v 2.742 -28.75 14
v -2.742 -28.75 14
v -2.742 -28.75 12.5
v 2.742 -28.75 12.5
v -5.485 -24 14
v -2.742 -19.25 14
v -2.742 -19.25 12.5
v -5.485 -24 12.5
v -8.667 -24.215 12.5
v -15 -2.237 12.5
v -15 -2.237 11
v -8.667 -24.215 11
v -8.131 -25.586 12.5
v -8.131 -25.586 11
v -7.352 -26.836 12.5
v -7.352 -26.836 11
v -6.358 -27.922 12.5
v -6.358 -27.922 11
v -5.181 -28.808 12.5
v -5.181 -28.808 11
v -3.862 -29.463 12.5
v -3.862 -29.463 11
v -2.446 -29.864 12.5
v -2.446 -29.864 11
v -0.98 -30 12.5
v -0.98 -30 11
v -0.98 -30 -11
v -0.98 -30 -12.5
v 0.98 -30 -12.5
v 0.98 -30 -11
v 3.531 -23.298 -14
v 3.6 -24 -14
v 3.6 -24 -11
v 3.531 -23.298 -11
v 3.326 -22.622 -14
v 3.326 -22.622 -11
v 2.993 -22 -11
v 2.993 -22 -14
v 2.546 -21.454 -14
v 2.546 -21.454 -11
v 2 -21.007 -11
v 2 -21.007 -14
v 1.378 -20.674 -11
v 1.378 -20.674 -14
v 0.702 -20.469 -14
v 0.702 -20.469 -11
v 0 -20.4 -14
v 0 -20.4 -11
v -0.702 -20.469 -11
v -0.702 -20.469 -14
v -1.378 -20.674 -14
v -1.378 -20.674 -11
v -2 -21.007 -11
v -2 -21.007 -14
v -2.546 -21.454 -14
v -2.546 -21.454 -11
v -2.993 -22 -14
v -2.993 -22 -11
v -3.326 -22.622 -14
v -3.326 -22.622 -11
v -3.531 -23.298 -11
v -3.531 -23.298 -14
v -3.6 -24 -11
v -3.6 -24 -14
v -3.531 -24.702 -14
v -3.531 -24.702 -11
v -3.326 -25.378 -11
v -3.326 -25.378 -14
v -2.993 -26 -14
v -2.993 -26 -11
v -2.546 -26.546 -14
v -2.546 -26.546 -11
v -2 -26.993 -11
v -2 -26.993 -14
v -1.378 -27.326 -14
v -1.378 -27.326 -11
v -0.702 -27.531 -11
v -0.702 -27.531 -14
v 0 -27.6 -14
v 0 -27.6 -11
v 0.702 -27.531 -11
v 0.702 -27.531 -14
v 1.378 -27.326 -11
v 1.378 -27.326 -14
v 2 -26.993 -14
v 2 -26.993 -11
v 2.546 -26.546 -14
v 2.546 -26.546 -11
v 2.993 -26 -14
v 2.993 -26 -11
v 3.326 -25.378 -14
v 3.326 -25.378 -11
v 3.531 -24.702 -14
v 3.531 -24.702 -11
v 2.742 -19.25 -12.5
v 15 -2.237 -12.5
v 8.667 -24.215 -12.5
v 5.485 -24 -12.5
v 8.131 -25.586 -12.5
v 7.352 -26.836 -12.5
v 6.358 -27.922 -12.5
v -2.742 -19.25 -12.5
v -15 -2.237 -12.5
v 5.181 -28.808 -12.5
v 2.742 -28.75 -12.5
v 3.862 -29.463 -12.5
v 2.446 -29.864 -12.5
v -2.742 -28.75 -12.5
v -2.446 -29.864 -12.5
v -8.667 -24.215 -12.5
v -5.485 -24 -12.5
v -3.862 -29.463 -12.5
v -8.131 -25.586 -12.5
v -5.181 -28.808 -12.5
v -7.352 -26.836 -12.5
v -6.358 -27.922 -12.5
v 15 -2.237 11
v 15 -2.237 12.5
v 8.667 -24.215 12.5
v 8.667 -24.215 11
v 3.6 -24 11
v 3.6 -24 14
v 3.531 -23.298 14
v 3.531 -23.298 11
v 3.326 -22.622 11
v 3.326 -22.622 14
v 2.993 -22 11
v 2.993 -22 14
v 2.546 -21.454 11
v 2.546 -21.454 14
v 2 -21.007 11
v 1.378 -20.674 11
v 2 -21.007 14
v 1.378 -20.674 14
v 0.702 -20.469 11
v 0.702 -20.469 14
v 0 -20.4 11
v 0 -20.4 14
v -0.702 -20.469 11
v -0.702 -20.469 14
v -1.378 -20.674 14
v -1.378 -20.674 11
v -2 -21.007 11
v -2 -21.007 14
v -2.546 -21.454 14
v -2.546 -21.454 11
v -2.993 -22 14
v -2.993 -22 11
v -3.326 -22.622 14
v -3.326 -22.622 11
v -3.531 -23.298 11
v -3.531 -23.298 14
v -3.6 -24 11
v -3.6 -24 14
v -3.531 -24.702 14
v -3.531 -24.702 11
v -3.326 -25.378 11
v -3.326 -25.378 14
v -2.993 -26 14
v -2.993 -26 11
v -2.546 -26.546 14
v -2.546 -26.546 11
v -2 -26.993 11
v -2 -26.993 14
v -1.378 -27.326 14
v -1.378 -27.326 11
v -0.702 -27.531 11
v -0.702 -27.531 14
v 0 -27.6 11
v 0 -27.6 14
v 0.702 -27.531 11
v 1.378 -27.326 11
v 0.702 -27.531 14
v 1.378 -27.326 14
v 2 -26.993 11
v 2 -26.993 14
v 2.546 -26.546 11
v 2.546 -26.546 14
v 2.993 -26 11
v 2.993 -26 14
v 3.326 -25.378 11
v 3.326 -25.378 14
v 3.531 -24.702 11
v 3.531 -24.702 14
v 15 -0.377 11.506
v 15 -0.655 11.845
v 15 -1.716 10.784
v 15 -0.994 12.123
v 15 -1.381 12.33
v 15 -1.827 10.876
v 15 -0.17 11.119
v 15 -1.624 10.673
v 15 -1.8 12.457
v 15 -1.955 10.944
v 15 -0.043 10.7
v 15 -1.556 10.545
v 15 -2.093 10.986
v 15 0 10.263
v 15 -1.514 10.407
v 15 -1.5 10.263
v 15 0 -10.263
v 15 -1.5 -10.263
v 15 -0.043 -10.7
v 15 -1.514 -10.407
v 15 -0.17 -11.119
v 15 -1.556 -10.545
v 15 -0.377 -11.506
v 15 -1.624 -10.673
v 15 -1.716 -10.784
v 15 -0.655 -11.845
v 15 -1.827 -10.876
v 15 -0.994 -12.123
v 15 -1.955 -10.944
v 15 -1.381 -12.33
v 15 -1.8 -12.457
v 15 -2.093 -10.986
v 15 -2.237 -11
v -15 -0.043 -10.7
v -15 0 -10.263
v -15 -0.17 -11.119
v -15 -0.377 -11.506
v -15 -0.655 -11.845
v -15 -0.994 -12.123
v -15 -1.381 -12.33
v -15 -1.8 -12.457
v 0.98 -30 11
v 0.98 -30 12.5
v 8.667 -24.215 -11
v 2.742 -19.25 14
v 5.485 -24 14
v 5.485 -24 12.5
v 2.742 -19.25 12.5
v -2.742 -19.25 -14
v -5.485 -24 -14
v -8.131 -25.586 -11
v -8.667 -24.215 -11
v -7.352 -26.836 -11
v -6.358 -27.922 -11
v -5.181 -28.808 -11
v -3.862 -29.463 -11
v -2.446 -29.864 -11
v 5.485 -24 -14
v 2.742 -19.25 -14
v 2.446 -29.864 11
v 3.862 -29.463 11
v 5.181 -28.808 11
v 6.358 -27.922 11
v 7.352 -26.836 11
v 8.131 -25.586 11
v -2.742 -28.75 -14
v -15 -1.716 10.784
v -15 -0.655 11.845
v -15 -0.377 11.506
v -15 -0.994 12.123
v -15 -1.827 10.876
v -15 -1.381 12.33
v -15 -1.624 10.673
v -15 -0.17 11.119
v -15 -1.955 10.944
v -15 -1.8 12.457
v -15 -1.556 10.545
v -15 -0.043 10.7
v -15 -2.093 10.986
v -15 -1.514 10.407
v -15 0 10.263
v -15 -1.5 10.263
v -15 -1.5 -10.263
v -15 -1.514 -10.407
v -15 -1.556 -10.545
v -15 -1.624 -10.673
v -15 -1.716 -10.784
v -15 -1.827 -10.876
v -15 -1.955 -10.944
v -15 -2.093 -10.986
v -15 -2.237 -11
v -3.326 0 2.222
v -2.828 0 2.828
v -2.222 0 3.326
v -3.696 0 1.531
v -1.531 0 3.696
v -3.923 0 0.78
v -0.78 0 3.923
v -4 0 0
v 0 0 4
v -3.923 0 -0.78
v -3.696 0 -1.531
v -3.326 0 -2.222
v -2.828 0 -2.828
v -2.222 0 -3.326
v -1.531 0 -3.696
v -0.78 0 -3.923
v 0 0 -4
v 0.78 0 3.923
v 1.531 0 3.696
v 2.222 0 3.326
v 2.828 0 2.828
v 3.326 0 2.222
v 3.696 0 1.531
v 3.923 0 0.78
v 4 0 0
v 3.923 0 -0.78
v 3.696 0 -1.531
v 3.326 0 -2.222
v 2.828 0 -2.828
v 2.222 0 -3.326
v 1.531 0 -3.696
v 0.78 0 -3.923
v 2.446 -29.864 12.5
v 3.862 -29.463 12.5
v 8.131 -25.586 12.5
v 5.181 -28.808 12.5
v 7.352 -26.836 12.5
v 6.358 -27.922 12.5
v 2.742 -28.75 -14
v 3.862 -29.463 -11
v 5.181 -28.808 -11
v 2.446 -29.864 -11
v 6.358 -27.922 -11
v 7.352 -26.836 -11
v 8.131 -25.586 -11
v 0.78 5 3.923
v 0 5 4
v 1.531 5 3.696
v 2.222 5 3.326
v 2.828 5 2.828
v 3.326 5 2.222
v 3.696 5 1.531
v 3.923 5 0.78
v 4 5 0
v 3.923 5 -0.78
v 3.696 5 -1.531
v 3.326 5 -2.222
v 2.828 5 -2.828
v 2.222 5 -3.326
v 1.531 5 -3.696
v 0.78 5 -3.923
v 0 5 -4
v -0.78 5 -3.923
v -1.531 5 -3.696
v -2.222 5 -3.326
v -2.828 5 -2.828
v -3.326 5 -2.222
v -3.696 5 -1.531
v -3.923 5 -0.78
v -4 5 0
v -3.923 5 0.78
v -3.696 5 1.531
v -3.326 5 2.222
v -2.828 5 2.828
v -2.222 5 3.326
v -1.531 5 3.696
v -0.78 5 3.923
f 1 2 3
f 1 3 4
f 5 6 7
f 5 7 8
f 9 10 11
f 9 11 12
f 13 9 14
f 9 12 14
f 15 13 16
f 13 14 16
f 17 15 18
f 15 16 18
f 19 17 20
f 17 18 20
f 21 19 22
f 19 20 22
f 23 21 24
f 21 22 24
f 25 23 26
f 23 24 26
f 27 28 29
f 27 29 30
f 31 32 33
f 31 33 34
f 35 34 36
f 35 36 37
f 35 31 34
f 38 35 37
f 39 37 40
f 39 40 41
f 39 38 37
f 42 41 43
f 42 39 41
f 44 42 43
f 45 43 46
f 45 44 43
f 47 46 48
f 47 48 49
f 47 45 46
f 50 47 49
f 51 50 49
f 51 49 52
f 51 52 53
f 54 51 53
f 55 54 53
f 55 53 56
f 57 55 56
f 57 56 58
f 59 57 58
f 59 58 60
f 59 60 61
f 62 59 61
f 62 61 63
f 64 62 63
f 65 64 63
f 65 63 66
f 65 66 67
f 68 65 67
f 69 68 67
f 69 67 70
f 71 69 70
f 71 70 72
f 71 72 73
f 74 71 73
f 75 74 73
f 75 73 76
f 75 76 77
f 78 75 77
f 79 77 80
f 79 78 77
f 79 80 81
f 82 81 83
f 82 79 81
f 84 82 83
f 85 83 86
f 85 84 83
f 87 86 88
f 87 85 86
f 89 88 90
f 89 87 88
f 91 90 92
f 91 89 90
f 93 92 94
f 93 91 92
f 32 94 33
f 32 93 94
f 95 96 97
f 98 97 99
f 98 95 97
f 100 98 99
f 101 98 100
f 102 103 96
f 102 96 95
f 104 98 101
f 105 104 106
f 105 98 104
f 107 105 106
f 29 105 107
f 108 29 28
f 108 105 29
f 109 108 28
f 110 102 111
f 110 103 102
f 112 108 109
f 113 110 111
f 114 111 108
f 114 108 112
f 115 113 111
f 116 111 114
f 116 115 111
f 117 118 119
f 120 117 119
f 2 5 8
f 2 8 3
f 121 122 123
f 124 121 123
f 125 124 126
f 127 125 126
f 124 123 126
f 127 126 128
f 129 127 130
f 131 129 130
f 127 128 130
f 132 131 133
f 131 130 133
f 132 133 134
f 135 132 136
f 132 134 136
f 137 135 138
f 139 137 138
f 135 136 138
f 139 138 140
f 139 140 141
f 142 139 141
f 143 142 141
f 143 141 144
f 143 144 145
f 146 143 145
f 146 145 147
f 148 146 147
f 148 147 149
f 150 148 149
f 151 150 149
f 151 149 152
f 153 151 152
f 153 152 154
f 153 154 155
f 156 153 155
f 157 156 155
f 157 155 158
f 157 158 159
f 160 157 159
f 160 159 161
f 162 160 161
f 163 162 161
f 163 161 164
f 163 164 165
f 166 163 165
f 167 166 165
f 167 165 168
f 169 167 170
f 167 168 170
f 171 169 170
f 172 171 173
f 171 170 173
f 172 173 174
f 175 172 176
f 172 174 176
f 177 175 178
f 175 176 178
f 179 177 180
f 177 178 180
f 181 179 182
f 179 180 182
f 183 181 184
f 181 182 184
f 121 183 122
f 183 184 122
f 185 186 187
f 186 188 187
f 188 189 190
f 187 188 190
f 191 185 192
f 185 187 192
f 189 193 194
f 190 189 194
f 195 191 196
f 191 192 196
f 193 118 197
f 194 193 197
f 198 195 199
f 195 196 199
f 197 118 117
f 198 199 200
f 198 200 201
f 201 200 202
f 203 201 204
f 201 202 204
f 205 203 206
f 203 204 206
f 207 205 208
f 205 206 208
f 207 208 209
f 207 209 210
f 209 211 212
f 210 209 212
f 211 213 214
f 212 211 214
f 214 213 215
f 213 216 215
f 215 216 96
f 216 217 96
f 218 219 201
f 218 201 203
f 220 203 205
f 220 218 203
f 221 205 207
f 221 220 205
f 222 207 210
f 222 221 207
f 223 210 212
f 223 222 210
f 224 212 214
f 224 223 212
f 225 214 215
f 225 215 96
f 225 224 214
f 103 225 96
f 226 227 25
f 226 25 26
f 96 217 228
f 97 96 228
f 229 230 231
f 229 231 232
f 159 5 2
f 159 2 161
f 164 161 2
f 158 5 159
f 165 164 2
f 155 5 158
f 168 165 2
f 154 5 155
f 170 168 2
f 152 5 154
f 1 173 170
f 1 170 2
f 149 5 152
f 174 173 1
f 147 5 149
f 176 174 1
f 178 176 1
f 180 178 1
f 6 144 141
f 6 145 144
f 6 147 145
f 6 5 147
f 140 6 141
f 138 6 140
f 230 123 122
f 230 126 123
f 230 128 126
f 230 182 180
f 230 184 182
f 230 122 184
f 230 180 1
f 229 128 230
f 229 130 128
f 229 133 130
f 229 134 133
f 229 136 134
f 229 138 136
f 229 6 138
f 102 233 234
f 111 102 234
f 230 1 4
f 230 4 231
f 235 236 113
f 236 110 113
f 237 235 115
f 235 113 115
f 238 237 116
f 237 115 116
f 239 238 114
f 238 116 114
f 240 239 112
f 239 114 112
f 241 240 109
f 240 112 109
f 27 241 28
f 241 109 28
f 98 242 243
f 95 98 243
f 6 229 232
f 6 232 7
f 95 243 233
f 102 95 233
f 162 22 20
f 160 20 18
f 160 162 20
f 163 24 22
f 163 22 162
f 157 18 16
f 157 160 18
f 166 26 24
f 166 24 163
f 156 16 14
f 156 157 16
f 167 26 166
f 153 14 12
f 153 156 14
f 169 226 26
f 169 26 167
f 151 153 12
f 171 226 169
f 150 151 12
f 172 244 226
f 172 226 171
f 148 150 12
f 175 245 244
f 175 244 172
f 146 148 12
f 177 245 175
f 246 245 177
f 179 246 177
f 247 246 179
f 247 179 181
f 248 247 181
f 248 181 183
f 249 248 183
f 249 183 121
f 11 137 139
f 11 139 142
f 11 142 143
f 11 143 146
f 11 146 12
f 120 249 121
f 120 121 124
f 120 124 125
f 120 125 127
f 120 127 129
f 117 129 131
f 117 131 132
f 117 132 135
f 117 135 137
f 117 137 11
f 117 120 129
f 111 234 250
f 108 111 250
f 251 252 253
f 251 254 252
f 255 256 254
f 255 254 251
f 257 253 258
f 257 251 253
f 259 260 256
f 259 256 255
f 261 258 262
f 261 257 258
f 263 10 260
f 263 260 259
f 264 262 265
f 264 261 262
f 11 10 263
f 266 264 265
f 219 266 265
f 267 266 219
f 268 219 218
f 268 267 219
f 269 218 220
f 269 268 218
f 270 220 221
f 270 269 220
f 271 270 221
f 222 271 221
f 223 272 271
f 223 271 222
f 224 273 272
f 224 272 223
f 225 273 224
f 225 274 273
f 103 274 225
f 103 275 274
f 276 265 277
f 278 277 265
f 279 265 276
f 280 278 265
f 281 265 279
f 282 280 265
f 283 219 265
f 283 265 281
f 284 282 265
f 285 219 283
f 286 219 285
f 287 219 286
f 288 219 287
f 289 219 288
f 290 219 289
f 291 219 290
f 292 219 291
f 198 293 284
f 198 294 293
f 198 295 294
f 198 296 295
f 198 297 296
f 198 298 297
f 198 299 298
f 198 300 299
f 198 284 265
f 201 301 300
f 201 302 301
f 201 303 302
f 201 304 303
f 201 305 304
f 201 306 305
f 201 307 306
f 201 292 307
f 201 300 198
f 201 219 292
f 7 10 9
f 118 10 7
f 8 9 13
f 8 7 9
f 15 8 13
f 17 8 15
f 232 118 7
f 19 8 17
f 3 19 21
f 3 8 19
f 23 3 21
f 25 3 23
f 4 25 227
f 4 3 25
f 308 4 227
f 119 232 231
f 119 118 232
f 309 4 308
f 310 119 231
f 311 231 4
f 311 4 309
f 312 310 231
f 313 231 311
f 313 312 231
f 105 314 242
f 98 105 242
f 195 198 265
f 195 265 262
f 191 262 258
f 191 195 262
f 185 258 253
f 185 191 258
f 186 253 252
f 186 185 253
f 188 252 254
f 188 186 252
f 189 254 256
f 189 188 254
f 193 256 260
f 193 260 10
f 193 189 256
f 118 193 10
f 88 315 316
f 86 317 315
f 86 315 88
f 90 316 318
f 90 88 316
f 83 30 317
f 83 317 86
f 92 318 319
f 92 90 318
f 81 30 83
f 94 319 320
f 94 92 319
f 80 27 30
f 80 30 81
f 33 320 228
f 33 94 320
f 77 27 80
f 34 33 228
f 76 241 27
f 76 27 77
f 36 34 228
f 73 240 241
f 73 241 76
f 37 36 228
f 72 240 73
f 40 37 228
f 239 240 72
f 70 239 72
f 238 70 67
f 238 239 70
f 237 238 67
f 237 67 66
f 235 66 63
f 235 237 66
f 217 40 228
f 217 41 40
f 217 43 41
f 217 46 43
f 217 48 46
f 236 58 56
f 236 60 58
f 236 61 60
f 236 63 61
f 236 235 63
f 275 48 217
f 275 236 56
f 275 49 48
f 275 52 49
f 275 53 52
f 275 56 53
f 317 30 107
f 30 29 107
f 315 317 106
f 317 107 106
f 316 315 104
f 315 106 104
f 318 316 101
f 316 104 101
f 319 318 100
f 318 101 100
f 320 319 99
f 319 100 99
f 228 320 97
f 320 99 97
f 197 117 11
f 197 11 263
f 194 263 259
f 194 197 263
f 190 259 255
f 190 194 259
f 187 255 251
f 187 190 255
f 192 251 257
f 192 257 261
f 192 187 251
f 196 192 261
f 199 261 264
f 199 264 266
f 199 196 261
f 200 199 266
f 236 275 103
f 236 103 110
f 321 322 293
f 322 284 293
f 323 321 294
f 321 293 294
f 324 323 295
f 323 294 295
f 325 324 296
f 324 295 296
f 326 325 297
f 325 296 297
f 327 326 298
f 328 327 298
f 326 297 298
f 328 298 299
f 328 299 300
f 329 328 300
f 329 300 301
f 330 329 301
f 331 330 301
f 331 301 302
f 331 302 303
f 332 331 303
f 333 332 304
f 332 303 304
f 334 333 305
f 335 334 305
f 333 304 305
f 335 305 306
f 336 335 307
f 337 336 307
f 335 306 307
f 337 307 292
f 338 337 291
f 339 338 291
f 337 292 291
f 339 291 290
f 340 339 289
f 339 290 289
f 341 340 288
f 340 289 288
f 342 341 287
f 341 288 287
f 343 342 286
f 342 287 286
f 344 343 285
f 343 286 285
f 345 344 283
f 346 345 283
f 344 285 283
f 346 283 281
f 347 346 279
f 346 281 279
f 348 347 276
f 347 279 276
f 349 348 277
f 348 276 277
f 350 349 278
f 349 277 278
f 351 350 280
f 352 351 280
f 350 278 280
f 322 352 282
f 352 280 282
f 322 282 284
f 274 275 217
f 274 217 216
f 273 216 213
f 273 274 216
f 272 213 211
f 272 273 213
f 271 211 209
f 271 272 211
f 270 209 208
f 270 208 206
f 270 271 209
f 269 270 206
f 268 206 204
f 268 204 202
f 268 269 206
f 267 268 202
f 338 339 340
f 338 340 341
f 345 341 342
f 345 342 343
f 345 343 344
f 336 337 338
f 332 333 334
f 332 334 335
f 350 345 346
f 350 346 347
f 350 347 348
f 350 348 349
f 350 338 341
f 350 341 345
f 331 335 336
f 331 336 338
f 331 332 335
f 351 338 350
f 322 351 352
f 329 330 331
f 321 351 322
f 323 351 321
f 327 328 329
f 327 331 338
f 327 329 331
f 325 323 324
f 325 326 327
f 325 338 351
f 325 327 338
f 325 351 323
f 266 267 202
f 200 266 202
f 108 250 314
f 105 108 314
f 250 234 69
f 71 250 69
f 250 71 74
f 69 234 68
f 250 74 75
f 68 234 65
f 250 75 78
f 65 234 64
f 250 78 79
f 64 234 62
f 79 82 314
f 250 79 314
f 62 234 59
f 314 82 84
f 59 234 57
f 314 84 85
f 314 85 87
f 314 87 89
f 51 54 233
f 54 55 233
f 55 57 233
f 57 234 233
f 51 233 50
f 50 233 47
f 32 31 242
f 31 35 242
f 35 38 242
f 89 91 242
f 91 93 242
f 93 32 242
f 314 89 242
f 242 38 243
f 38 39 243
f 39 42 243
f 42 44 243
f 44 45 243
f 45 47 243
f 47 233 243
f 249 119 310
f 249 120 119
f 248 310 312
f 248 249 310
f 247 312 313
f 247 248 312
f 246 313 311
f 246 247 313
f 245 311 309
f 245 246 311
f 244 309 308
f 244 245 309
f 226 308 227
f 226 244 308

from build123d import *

# Parameters (mm, degrees)
SKETCH1_W                      = 30
SKETCH1_H                      = 22
BASE_FLANGE1_DEPTH             = 1.5
EDGE_FLANGE1_STRIP_W           = 7.4732
EDGE_FLANGE1_STRIP_H           = 1.5
EDGE_FLANGE1_STRIP_CUT_DEPTH   = 30
EDGE_FLANGE1_STRIP_2_W         = 7.4732
EDGE_FLANGE1_STRIP_2_H         = 1.5
EDGE_FLANGE1_STRIP_CUT_2_DEPTH = 30
EDGE_FLANGE1_DEPTH             = 30
EDGE_FLANGE1_BEND_DEPTH        = 30
CUT_EXTRUDE1_DEPTH             = 42.833001327
FILLET1_R                      = 8
SKETCH12_R                     = 3.6
CUT_EXTRUDE2_DEPTH             = 42.833001327
BOSS_EXTRUDE1_START            = 1.5
SKETCH13_R                     = 3.6
BOSS_EXTRUDE1_DEPTH            = 1.5
SKETCH14_R                     = 6
BOSS_EXTRUDE2_DEPTH            = 1
SKETCH15_R                     = 10
BOSS_EXTRUDE3_DEPTH            = 4
FILLET2_R                      = 2
SKETCH16_R                     = 4
BOSS_EXTRUDE4_DEPTH            = 5
CUT_EXTRUDE4_START             = -10
SKETCH17_R                     = 10.163794577
SKETCH17_R_2                   = 4
CUT_EXTRUDE4_DEPTH             = 10
CUT_EXTRUDE5_START             = -5
SKETCH18_R                     = 4
CUT_EXTRUDE5_DEPTH             = 5


# Sheet-metal steps are written as plain solids
with BuildPart() as part:
    # Sketch1 → Base-Flange1 (new body)
    with BuildSketch(Plane(origin=(0, 0, 0), x_dir=(1, 0, 0), z_dir=(0, 1, 0))):
        Rectangle(SKETCH1_W, SKETCH1_H)
    extrude(amount=-BASE_FLANGE1_DEPTH)

    # Edge-Flange1 strip (across the edge) → Edge-Flange1 strip cut (cut)
    with BuildSketch(Plane(origin=(15, -1.5, 11), x_dir=(0, 0, -1), z_dir=(-1, 0, 0))):
        with Locations((-3, -0.75)):
            Rectangle(EDGE_FLANGE1_STRIP_W, EDGE_FLANGE1_STRIP_H)
    extrude(amount=EDGE_FLANGE1_STRIP_CUT_DEPTH, mode=Mode.SUBTRACT)

    # Edge-Flange1 strip 2 (across the edge) → Edge-Flange1 strip cut 2 (cut)
    with BuildSketch(Plane(origin=(-15, -1.5, -11), x_dir=(0, 0, 1), z_dir=(1, 0, 0))):
        with Locations((-3, -0.75)):
            Rectangle(EDGE_FLANGE1_STRIP_2_W, EDGE_FLANGE1_STRIP_2_H)
    extrude(amount=EDGE_FLANGE1_STRIP_CUT_2_DEPTH, mode=Mode.SUBTRACT)

    # Edge-Flange1 section (across the edge) → Edge-Flange1 (add)
    with BuildSketch(Plane(origin=(15, -1.5, 11), x_dir=(0, 0, -1), z_dir=(-1, 0, 0))):
        with BuildLine():
            Line((-1.5, 0.7366), (-1.5, 28.5))
            Line((-1.5, 28.5), (0, 28.5))
            Line((0, 28.5), (0, 0.7366))
            ThreePointArc((0, 0.7366), (0.215745145, 0.215745145), (0.7366, 0))
            Line((0.7366, 0), (0.7366, -1.5))
            ThreePointArc((0.7366, -1.5), (-0.844915027, -0.844915027), (-1.5, 0.7366))
        make_face()
    extrude(amount=EDGE_FLANGE1_DEPTH)

    # Edge-Flange1 section 2 (across the edge) → Edge-Flange1 bend (add)
    with BuildSketch(Plane(origin=(-15, -1.5, -11), x_dir=(0, 0, 1), z_dir=(1, 0, 0))):
        with BuildLine():
            Line((-1.5, 0.7366), (-1.5, 28.5))
            Line((-1.5, 28.5), (0, 28.5))
            Line((0, 28.5), (0, 0.7366))
            ThreePointArc((0, 0.7366), (0.215745145, 0.215745145), (0.7366, 0))
            Line((0.7366, 0), (0.7366, -1.5))
            ThreePointArc((0.7366, -1.5), (-0.844915027, -0.844915027), (-1.5, 0.7366))
        make_face()
    extrude(amount=EDGE_FLANGE1_BEND_DEPTH)

    # Sketch11 → Cut-Extrude1 (cut, through all)
    with BuildSketch(Plane.XY.offset(12.5)):
        Polygon((-15, -2.2366), (-7, -30), (-15, -30), align=None)
        Polygon((15, -2.2366), (7, -30), (15, -30), align=None)
    extrude(amount=-CUT_EXTRUDE1_DEPTH, mode=Mode.SUBTRACT)

    # Fillet1
    fillet1_edges = [part.edges().sort_by_distance(p)[0] for p in [
        (7, -30, 11.75),
        (7, -30, -11.75),
        (-7, -30, 11.75),
        (-7, -30, -11.75),
    ]]
    fillet(fillet1_edges, radius=FILLET1_R)

    # Sketch12 → Cut-Extrude2 (cut, through all)
    with BuildSketch(Plane.XY.offset(12.5)):
        with Locations((0, -24)):
            Circle(SKETCH12_R)
    extrude(amount=-CUT_EXTRUDE2_DEPTH, mode=Mode.SUBTRACT)

    # Sketch13 → Boss-Extrude1 (add)
    with BuildSketch(Plane.XY.offset(12.5).offset(BOSS_EXTRUDE1_START)):
        Polygon((5.484827557, -24), (2.742413779, -19.25), (-2.742413779, -19.25), (-5.484827557, -24), (-2.742413779, -28.75), (2.742413779, -28.75), align=None)
        with Locations((0, -24)):
            Circle(SKETCH13_R, mode=Mode.SUBTRACT)
    boss_extrude1 = extrude(amount=-BOSS_EXTRUDE1_DEPTH)

    # Mirror1: Boss-Extrude1 across plane
    add(boss_extrude1.mirror(Plane.XY))

    # Sketch14 → Boss-Extrude2 (add)
    with BuildSketch(Plane(origin=(0, 0, 0), x_dir=(1, 0, 0), z_dir=(0, 1, 0))):
        with Locations(Location((0, 0, 0), (0, 0, 90))):
            Circle(SKETCH14_R)
    extrude(amount=BOSS_EXTRUDE2_DEPTH)

    # Sketch15 → Boss-Extrude3 (add)
    with BuildSketch(Plane(origin=(0, 1, 0), x_dir=(1, 0, 0), z_dir=(0, 1, 0))):
        with Locations(Location((0, 0, 0), (0, 0, 270))):
            Circle(SKETCH15_R)
    extrude(amount=BOSS_EXTRUDE3_DEPTH)

    # Fillet2
    fillet2_edges = [part.edges().sort_by_distance(p)[0] for p in [
        (0, 1, -10),
    ]]
    fillet(fillet2_edges, radius=FILLET2_R)

    # Sketch16 → Boss-Extrude4 (add)
    with BuildSketch(Plane(origin=(0, 5, 0), x_dir=(1, 0, 0), z_dir=(0, 1, 0))):
        with Locations(Location((0, 0, 0), (0, 0, 270))):
            Circle(SKETCH16_R)
    extrude(amount=BOSS_EXTRUDE4_DEPTH)

    # Sketch17 → Cut-Extrude4 (cut)
    with BuildSketch(Plane(origin=(0, 10, 0), x_dir=(1, 0, 0), z_dir=(0, 1, 0)).offset(CUT_EXTRUDE4_START)):
        Circle(SKETCH17_R)
        with Locations(Location((0, 0, 0), (0, 0, 270))):
            Circle(SKETCH17_R_2, mode=Mode.SUBTRACT)
    extrude(amount=CUT_EXTRUDE4_DEPTH, mode=Mode.SUBTRACT)

    # Sketch18 → Cut-Extrude5 (cut)
    with BuildSketch(Plane(origin=(0, 10, 0), x_dir=(1, 0, 0), z_dir=(0, 1, 0)).offset(CUT_EXTRUDE5_START)):
        with Locations(Location((0, 0, 0), (0, 0, 270))):
            Circle(SKETCH18_R)
    extrude(amount=CUT_EXTRUDE5_DEPTH, mode=Mode.SUBTRACT)


solid = part.part
